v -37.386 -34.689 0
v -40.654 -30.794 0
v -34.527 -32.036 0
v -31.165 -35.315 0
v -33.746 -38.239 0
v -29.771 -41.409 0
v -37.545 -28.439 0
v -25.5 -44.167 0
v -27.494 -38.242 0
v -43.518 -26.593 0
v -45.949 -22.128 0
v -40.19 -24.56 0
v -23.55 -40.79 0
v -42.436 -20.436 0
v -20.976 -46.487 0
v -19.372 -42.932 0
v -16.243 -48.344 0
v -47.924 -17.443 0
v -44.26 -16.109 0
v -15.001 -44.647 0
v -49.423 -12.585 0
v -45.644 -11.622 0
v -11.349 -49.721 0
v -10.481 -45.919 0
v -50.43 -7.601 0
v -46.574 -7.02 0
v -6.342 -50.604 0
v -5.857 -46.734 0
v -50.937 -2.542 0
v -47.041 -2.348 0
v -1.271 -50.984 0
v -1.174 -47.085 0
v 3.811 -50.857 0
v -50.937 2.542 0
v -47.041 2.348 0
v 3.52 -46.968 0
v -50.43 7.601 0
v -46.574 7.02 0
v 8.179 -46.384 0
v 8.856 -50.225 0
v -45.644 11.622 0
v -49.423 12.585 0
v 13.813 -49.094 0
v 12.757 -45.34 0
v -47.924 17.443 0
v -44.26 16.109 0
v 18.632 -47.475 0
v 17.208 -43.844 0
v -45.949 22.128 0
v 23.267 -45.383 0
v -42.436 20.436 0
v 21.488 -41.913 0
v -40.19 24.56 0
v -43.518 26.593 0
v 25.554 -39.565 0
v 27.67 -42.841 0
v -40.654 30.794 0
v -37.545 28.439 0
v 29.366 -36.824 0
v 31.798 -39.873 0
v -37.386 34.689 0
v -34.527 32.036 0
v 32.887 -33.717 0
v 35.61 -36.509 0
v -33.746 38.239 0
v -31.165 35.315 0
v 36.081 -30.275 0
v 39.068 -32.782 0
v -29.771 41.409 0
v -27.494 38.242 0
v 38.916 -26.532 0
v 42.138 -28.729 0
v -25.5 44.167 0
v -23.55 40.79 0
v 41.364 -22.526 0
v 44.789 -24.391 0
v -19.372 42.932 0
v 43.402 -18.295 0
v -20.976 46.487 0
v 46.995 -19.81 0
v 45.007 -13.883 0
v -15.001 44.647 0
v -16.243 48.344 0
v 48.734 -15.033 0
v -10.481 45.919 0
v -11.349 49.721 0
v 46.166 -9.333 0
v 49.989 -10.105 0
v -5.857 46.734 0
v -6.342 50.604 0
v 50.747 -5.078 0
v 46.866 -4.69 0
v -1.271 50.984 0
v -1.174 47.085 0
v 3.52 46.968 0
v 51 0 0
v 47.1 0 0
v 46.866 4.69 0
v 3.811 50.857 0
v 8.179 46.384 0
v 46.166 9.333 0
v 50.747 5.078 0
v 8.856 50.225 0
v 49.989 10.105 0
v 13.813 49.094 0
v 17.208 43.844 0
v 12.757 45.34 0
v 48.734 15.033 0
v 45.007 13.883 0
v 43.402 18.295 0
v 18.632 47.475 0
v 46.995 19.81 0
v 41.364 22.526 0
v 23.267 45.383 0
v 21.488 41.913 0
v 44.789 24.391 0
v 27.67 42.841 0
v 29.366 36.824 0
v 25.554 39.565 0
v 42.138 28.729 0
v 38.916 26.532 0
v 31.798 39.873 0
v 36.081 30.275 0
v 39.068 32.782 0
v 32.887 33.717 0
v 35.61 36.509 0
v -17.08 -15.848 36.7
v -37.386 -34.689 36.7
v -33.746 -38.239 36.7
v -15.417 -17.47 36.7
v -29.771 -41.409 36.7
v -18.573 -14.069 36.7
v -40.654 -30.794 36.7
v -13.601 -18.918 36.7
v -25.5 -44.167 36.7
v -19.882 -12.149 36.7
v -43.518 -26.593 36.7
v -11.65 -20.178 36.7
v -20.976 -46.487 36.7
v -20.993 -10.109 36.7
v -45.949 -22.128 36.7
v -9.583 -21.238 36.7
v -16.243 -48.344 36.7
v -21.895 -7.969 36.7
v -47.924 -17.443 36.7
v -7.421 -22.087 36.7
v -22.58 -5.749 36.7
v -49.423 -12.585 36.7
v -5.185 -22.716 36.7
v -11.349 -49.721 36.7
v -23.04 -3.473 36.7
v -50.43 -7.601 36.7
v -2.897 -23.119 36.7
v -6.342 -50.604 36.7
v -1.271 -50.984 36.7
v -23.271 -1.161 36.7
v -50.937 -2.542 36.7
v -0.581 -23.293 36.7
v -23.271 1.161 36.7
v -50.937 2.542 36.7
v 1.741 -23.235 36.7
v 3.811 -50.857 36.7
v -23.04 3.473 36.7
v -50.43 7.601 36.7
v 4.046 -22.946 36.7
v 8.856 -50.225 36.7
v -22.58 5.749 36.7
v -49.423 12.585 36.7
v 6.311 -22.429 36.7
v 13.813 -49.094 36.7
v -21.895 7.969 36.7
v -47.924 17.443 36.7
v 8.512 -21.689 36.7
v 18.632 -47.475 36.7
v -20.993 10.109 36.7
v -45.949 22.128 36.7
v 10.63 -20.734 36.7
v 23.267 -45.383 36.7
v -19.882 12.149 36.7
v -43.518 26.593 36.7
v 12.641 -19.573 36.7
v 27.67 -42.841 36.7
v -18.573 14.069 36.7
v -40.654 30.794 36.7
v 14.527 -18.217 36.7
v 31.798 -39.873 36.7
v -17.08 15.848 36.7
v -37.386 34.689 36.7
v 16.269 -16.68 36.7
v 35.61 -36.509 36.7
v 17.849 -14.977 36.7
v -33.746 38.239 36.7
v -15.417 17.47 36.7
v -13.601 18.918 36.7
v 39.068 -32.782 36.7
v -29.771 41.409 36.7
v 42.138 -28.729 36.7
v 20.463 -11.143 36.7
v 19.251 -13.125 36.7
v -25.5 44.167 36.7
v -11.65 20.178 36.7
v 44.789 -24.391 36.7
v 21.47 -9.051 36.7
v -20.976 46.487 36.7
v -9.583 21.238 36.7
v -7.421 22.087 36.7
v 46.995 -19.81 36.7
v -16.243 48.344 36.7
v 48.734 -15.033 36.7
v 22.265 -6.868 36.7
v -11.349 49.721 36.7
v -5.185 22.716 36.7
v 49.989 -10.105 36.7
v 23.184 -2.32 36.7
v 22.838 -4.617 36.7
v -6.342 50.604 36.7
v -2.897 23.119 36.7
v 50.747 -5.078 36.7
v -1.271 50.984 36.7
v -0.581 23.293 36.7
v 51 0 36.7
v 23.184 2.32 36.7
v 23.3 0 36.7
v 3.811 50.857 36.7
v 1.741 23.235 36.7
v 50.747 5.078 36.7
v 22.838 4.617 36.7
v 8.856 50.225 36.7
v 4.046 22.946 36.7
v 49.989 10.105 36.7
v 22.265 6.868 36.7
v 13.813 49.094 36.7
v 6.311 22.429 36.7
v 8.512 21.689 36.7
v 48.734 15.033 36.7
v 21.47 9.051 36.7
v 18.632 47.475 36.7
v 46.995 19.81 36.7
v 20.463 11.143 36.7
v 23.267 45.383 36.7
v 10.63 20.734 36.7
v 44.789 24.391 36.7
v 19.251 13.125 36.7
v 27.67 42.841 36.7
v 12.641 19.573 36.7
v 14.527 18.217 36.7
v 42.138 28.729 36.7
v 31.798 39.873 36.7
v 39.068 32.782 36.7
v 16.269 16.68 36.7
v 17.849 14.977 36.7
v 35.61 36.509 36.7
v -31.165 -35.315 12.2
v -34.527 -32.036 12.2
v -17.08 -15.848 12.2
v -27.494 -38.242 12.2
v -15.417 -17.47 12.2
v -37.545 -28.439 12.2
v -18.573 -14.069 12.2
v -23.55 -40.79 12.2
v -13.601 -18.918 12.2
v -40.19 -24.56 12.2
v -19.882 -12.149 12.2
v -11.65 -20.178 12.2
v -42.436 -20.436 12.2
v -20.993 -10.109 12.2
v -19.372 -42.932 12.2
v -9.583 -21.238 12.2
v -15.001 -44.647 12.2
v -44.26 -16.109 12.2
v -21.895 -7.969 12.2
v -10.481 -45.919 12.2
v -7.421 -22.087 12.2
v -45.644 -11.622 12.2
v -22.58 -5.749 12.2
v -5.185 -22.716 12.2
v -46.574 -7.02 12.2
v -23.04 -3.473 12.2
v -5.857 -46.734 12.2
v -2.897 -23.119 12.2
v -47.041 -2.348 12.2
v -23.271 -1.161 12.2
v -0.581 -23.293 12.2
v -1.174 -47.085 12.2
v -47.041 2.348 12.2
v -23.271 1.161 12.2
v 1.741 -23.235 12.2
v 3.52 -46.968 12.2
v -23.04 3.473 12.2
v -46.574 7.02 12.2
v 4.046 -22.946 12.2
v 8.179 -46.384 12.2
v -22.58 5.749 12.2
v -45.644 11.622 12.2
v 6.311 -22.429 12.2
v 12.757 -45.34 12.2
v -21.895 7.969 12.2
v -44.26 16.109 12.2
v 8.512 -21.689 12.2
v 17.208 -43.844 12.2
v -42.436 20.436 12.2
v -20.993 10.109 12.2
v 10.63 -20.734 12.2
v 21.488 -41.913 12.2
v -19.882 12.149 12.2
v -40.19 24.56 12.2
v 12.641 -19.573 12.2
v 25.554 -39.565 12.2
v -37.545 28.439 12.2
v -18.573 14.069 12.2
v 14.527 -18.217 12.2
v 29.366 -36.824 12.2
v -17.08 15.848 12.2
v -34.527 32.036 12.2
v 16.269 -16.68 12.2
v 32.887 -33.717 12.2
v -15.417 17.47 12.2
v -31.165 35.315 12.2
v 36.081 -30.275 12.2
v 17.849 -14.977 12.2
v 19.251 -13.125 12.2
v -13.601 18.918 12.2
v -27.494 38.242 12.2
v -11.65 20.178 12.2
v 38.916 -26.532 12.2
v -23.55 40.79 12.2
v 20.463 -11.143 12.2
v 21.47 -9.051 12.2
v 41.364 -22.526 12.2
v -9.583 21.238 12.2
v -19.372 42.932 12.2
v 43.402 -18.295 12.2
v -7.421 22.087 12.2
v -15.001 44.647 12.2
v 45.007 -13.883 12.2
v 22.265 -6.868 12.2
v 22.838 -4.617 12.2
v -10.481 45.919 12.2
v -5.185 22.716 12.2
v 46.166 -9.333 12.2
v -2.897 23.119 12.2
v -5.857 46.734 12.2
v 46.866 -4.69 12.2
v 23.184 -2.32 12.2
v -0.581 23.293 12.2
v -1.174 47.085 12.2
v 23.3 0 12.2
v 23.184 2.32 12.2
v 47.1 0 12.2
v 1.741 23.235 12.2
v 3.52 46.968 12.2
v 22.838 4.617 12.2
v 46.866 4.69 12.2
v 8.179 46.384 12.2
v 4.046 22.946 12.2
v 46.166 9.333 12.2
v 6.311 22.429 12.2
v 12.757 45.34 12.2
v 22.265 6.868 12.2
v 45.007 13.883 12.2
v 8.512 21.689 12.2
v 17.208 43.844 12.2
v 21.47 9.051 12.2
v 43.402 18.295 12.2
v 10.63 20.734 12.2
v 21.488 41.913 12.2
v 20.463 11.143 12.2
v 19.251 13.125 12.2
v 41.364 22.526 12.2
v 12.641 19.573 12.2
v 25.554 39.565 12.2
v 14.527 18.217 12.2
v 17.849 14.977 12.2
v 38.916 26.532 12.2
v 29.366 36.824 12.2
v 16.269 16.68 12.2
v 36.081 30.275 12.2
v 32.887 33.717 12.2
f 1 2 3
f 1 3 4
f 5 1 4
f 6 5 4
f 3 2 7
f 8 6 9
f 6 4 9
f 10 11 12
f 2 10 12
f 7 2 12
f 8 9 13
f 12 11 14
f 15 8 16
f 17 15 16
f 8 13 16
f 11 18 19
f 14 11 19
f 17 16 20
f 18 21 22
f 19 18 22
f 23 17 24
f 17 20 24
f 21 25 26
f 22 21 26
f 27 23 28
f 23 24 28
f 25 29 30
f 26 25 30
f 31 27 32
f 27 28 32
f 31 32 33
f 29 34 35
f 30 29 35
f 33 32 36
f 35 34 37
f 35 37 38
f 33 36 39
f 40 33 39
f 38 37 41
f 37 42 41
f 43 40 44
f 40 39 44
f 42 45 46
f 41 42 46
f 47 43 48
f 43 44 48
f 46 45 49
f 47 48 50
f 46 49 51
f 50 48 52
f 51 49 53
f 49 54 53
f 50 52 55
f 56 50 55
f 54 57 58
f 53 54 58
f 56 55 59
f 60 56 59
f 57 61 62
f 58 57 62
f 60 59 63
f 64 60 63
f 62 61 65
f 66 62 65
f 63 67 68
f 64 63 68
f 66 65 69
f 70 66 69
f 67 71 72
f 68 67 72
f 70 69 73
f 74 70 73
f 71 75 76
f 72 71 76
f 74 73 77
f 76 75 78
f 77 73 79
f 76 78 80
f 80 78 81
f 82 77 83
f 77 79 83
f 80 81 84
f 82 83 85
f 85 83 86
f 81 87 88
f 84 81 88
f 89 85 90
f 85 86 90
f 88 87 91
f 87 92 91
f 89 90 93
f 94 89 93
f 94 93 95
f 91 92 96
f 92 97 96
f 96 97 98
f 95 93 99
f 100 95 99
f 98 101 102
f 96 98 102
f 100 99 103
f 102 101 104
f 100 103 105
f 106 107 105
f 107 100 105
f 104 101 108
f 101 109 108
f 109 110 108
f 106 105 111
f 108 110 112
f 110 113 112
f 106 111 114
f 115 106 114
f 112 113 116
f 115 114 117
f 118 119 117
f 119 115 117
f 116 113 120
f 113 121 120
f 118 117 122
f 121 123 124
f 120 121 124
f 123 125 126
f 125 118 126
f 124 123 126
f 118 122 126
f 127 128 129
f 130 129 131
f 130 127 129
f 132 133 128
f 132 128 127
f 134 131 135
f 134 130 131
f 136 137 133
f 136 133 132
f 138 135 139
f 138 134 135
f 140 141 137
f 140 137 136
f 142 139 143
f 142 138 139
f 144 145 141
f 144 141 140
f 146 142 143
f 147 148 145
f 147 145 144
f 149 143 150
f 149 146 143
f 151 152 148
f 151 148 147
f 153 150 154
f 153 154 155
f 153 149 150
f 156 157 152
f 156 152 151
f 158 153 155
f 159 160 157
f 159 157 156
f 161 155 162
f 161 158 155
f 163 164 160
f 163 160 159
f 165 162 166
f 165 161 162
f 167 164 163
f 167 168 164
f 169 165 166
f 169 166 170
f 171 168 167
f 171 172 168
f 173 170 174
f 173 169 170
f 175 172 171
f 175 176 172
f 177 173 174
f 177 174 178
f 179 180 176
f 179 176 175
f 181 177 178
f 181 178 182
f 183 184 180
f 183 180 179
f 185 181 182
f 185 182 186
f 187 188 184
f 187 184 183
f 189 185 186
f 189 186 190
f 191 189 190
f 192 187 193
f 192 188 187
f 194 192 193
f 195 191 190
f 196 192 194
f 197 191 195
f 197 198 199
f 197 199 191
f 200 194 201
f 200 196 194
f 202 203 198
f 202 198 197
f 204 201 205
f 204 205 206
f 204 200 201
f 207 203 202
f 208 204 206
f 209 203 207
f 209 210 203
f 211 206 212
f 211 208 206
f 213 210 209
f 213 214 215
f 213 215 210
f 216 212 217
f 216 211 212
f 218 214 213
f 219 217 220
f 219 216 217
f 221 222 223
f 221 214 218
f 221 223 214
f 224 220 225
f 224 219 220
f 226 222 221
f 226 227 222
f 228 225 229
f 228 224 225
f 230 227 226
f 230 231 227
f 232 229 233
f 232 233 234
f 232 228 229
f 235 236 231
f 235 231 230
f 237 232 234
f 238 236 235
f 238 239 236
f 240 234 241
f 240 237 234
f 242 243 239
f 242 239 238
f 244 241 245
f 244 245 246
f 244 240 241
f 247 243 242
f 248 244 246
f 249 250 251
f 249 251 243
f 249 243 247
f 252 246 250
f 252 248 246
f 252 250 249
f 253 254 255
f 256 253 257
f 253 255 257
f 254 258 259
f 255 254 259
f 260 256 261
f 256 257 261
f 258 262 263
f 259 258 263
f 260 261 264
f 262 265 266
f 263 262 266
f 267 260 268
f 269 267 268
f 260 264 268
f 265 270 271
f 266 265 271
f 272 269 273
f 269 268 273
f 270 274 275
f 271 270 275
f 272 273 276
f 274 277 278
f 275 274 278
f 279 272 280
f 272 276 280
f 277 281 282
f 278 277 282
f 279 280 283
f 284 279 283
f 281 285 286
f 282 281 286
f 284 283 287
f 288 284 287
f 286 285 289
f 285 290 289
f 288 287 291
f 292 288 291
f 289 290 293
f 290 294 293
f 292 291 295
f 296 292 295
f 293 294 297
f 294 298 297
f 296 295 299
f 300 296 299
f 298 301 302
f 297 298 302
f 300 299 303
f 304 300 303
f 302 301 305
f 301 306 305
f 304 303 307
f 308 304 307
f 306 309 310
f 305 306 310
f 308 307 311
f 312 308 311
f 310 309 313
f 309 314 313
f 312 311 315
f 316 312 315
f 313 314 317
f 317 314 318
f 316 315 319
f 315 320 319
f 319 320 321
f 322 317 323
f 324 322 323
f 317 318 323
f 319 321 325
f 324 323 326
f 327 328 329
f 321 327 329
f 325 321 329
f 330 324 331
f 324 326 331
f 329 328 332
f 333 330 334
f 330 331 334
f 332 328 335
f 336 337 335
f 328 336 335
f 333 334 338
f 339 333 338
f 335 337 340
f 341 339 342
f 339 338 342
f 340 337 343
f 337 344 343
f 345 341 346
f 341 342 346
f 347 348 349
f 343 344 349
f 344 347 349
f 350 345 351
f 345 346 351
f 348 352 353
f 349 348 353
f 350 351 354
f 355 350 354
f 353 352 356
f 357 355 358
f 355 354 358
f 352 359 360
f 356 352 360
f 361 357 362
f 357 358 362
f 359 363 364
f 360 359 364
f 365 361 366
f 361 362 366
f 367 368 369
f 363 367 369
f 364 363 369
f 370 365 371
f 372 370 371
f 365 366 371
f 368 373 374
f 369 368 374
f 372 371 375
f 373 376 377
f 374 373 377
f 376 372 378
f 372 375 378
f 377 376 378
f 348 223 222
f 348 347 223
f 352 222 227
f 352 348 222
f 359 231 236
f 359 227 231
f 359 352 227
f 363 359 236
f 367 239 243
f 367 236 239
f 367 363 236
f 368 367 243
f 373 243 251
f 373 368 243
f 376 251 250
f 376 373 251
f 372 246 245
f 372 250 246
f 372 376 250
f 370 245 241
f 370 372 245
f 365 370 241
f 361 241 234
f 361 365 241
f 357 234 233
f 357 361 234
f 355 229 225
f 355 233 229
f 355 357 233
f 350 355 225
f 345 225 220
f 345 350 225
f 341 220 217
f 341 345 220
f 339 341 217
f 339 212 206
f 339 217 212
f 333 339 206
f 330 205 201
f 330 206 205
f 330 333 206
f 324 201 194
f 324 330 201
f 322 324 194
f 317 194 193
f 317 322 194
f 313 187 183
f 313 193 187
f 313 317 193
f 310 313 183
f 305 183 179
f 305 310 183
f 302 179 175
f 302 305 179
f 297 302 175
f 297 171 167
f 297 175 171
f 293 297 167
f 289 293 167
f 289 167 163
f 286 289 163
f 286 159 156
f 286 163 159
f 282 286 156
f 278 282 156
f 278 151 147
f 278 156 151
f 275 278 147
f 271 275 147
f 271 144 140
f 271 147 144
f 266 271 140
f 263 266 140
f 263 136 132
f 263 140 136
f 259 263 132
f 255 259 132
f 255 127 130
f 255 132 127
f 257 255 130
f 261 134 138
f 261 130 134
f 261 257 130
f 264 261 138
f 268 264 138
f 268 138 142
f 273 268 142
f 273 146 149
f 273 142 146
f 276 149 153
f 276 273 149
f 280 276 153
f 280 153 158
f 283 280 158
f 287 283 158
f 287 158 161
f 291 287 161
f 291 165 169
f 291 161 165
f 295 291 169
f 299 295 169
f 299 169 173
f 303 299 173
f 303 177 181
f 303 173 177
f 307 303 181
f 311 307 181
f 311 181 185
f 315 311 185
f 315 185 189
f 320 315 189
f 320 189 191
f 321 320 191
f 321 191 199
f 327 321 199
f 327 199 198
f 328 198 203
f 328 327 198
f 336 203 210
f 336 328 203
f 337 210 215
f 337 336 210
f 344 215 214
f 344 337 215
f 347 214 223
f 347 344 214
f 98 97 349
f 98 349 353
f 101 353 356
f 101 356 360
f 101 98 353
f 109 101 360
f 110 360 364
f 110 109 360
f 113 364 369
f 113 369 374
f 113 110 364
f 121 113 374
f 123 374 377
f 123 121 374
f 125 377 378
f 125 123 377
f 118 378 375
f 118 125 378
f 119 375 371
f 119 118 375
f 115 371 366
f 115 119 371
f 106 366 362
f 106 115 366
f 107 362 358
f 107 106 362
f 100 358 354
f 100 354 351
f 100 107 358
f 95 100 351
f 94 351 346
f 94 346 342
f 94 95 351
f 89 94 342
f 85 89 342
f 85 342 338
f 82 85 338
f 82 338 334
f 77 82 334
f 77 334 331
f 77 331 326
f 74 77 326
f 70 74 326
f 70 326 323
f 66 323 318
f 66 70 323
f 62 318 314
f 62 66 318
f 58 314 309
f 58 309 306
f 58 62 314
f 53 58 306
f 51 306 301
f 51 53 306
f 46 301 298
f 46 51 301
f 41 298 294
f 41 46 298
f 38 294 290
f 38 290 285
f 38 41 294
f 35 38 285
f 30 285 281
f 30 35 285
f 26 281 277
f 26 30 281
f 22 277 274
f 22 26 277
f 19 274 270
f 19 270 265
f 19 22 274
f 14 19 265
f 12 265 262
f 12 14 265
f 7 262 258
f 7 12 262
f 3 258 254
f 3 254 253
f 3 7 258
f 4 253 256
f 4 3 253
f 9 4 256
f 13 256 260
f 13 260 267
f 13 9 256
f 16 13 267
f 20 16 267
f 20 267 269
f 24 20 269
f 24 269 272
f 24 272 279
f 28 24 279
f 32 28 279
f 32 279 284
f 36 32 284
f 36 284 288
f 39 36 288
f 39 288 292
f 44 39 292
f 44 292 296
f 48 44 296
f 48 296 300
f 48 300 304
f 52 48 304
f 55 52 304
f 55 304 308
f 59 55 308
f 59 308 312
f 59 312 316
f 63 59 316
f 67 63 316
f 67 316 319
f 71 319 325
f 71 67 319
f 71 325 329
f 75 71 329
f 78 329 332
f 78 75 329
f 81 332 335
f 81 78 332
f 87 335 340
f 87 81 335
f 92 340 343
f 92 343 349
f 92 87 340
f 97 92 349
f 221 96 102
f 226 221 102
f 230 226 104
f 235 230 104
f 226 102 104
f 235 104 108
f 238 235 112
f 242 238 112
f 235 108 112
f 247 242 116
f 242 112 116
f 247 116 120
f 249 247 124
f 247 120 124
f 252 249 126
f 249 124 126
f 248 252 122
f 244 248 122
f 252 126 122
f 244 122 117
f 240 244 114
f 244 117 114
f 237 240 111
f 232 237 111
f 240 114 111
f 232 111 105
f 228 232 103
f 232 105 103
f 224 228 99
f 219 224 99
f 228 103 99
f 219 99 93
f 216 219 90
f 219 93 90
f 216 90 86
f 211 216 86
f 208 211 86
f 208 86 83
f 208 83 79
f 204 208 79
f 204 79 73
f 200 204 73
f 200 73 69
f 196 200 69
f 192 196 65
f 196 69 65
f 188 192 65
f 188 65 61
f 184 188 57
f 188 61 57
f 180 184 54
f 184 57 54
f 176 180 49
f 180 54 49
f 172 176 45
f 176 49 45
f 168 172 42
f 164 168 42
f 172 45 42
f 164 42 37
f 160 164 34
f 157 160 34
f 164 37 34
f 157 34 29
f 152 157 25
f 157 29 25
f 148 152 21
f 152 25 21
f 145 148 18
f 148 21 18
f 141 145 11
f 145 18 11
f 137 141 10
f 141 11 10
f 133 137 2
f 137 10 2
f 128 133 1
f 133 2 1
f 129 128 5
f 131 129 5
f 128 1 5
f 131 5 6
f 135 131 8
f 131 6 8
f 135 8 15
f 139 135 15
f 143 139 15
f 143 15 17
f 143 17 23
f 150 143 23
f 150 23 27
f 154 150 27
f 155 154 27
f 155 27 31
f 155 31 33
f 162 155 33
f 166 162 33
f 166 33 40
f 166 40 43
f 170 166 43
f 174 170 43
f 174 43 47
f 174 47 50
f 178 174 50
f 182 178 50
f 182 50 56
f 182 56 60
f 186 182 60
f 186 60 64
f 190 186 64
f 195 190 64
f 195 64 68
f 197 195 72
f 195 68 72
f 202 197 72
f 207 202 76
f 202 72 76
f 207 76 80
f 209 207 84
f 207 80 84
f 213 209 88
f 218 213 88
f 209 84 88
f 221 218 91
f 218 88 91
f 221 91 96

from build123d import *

# Parameters (mm, degrees)
F0_R     = 51
F1_DEPTH = 36.7
F2_R     = 47.1
F3_DEPTH = 12.2
F4_R     = 23.3
F5_DEPTH = 85


with BuildPart() as f1:
    # F0 (on Top) → F1 (new body)
    with BuildSketch(Plane.XY):
        Circle(F0_R)
    extrude(amount=F1_DEPTH)

    # F2 (on Top) → F3 (cut)
    with BuildSketch(Plane.XY):
        Circle(F2_R)
    extrude(amount=F3_DEPTH, mode=Mode.SUBTRACT)

    # F4 (on Top) → F5 (cut)
    with BuildSketch(Plane.XY):
        Circle(F4_R)
    extrude(amount=F5_DEPTH, mode=Mode.SUBTRACT)


solid = f1.part
